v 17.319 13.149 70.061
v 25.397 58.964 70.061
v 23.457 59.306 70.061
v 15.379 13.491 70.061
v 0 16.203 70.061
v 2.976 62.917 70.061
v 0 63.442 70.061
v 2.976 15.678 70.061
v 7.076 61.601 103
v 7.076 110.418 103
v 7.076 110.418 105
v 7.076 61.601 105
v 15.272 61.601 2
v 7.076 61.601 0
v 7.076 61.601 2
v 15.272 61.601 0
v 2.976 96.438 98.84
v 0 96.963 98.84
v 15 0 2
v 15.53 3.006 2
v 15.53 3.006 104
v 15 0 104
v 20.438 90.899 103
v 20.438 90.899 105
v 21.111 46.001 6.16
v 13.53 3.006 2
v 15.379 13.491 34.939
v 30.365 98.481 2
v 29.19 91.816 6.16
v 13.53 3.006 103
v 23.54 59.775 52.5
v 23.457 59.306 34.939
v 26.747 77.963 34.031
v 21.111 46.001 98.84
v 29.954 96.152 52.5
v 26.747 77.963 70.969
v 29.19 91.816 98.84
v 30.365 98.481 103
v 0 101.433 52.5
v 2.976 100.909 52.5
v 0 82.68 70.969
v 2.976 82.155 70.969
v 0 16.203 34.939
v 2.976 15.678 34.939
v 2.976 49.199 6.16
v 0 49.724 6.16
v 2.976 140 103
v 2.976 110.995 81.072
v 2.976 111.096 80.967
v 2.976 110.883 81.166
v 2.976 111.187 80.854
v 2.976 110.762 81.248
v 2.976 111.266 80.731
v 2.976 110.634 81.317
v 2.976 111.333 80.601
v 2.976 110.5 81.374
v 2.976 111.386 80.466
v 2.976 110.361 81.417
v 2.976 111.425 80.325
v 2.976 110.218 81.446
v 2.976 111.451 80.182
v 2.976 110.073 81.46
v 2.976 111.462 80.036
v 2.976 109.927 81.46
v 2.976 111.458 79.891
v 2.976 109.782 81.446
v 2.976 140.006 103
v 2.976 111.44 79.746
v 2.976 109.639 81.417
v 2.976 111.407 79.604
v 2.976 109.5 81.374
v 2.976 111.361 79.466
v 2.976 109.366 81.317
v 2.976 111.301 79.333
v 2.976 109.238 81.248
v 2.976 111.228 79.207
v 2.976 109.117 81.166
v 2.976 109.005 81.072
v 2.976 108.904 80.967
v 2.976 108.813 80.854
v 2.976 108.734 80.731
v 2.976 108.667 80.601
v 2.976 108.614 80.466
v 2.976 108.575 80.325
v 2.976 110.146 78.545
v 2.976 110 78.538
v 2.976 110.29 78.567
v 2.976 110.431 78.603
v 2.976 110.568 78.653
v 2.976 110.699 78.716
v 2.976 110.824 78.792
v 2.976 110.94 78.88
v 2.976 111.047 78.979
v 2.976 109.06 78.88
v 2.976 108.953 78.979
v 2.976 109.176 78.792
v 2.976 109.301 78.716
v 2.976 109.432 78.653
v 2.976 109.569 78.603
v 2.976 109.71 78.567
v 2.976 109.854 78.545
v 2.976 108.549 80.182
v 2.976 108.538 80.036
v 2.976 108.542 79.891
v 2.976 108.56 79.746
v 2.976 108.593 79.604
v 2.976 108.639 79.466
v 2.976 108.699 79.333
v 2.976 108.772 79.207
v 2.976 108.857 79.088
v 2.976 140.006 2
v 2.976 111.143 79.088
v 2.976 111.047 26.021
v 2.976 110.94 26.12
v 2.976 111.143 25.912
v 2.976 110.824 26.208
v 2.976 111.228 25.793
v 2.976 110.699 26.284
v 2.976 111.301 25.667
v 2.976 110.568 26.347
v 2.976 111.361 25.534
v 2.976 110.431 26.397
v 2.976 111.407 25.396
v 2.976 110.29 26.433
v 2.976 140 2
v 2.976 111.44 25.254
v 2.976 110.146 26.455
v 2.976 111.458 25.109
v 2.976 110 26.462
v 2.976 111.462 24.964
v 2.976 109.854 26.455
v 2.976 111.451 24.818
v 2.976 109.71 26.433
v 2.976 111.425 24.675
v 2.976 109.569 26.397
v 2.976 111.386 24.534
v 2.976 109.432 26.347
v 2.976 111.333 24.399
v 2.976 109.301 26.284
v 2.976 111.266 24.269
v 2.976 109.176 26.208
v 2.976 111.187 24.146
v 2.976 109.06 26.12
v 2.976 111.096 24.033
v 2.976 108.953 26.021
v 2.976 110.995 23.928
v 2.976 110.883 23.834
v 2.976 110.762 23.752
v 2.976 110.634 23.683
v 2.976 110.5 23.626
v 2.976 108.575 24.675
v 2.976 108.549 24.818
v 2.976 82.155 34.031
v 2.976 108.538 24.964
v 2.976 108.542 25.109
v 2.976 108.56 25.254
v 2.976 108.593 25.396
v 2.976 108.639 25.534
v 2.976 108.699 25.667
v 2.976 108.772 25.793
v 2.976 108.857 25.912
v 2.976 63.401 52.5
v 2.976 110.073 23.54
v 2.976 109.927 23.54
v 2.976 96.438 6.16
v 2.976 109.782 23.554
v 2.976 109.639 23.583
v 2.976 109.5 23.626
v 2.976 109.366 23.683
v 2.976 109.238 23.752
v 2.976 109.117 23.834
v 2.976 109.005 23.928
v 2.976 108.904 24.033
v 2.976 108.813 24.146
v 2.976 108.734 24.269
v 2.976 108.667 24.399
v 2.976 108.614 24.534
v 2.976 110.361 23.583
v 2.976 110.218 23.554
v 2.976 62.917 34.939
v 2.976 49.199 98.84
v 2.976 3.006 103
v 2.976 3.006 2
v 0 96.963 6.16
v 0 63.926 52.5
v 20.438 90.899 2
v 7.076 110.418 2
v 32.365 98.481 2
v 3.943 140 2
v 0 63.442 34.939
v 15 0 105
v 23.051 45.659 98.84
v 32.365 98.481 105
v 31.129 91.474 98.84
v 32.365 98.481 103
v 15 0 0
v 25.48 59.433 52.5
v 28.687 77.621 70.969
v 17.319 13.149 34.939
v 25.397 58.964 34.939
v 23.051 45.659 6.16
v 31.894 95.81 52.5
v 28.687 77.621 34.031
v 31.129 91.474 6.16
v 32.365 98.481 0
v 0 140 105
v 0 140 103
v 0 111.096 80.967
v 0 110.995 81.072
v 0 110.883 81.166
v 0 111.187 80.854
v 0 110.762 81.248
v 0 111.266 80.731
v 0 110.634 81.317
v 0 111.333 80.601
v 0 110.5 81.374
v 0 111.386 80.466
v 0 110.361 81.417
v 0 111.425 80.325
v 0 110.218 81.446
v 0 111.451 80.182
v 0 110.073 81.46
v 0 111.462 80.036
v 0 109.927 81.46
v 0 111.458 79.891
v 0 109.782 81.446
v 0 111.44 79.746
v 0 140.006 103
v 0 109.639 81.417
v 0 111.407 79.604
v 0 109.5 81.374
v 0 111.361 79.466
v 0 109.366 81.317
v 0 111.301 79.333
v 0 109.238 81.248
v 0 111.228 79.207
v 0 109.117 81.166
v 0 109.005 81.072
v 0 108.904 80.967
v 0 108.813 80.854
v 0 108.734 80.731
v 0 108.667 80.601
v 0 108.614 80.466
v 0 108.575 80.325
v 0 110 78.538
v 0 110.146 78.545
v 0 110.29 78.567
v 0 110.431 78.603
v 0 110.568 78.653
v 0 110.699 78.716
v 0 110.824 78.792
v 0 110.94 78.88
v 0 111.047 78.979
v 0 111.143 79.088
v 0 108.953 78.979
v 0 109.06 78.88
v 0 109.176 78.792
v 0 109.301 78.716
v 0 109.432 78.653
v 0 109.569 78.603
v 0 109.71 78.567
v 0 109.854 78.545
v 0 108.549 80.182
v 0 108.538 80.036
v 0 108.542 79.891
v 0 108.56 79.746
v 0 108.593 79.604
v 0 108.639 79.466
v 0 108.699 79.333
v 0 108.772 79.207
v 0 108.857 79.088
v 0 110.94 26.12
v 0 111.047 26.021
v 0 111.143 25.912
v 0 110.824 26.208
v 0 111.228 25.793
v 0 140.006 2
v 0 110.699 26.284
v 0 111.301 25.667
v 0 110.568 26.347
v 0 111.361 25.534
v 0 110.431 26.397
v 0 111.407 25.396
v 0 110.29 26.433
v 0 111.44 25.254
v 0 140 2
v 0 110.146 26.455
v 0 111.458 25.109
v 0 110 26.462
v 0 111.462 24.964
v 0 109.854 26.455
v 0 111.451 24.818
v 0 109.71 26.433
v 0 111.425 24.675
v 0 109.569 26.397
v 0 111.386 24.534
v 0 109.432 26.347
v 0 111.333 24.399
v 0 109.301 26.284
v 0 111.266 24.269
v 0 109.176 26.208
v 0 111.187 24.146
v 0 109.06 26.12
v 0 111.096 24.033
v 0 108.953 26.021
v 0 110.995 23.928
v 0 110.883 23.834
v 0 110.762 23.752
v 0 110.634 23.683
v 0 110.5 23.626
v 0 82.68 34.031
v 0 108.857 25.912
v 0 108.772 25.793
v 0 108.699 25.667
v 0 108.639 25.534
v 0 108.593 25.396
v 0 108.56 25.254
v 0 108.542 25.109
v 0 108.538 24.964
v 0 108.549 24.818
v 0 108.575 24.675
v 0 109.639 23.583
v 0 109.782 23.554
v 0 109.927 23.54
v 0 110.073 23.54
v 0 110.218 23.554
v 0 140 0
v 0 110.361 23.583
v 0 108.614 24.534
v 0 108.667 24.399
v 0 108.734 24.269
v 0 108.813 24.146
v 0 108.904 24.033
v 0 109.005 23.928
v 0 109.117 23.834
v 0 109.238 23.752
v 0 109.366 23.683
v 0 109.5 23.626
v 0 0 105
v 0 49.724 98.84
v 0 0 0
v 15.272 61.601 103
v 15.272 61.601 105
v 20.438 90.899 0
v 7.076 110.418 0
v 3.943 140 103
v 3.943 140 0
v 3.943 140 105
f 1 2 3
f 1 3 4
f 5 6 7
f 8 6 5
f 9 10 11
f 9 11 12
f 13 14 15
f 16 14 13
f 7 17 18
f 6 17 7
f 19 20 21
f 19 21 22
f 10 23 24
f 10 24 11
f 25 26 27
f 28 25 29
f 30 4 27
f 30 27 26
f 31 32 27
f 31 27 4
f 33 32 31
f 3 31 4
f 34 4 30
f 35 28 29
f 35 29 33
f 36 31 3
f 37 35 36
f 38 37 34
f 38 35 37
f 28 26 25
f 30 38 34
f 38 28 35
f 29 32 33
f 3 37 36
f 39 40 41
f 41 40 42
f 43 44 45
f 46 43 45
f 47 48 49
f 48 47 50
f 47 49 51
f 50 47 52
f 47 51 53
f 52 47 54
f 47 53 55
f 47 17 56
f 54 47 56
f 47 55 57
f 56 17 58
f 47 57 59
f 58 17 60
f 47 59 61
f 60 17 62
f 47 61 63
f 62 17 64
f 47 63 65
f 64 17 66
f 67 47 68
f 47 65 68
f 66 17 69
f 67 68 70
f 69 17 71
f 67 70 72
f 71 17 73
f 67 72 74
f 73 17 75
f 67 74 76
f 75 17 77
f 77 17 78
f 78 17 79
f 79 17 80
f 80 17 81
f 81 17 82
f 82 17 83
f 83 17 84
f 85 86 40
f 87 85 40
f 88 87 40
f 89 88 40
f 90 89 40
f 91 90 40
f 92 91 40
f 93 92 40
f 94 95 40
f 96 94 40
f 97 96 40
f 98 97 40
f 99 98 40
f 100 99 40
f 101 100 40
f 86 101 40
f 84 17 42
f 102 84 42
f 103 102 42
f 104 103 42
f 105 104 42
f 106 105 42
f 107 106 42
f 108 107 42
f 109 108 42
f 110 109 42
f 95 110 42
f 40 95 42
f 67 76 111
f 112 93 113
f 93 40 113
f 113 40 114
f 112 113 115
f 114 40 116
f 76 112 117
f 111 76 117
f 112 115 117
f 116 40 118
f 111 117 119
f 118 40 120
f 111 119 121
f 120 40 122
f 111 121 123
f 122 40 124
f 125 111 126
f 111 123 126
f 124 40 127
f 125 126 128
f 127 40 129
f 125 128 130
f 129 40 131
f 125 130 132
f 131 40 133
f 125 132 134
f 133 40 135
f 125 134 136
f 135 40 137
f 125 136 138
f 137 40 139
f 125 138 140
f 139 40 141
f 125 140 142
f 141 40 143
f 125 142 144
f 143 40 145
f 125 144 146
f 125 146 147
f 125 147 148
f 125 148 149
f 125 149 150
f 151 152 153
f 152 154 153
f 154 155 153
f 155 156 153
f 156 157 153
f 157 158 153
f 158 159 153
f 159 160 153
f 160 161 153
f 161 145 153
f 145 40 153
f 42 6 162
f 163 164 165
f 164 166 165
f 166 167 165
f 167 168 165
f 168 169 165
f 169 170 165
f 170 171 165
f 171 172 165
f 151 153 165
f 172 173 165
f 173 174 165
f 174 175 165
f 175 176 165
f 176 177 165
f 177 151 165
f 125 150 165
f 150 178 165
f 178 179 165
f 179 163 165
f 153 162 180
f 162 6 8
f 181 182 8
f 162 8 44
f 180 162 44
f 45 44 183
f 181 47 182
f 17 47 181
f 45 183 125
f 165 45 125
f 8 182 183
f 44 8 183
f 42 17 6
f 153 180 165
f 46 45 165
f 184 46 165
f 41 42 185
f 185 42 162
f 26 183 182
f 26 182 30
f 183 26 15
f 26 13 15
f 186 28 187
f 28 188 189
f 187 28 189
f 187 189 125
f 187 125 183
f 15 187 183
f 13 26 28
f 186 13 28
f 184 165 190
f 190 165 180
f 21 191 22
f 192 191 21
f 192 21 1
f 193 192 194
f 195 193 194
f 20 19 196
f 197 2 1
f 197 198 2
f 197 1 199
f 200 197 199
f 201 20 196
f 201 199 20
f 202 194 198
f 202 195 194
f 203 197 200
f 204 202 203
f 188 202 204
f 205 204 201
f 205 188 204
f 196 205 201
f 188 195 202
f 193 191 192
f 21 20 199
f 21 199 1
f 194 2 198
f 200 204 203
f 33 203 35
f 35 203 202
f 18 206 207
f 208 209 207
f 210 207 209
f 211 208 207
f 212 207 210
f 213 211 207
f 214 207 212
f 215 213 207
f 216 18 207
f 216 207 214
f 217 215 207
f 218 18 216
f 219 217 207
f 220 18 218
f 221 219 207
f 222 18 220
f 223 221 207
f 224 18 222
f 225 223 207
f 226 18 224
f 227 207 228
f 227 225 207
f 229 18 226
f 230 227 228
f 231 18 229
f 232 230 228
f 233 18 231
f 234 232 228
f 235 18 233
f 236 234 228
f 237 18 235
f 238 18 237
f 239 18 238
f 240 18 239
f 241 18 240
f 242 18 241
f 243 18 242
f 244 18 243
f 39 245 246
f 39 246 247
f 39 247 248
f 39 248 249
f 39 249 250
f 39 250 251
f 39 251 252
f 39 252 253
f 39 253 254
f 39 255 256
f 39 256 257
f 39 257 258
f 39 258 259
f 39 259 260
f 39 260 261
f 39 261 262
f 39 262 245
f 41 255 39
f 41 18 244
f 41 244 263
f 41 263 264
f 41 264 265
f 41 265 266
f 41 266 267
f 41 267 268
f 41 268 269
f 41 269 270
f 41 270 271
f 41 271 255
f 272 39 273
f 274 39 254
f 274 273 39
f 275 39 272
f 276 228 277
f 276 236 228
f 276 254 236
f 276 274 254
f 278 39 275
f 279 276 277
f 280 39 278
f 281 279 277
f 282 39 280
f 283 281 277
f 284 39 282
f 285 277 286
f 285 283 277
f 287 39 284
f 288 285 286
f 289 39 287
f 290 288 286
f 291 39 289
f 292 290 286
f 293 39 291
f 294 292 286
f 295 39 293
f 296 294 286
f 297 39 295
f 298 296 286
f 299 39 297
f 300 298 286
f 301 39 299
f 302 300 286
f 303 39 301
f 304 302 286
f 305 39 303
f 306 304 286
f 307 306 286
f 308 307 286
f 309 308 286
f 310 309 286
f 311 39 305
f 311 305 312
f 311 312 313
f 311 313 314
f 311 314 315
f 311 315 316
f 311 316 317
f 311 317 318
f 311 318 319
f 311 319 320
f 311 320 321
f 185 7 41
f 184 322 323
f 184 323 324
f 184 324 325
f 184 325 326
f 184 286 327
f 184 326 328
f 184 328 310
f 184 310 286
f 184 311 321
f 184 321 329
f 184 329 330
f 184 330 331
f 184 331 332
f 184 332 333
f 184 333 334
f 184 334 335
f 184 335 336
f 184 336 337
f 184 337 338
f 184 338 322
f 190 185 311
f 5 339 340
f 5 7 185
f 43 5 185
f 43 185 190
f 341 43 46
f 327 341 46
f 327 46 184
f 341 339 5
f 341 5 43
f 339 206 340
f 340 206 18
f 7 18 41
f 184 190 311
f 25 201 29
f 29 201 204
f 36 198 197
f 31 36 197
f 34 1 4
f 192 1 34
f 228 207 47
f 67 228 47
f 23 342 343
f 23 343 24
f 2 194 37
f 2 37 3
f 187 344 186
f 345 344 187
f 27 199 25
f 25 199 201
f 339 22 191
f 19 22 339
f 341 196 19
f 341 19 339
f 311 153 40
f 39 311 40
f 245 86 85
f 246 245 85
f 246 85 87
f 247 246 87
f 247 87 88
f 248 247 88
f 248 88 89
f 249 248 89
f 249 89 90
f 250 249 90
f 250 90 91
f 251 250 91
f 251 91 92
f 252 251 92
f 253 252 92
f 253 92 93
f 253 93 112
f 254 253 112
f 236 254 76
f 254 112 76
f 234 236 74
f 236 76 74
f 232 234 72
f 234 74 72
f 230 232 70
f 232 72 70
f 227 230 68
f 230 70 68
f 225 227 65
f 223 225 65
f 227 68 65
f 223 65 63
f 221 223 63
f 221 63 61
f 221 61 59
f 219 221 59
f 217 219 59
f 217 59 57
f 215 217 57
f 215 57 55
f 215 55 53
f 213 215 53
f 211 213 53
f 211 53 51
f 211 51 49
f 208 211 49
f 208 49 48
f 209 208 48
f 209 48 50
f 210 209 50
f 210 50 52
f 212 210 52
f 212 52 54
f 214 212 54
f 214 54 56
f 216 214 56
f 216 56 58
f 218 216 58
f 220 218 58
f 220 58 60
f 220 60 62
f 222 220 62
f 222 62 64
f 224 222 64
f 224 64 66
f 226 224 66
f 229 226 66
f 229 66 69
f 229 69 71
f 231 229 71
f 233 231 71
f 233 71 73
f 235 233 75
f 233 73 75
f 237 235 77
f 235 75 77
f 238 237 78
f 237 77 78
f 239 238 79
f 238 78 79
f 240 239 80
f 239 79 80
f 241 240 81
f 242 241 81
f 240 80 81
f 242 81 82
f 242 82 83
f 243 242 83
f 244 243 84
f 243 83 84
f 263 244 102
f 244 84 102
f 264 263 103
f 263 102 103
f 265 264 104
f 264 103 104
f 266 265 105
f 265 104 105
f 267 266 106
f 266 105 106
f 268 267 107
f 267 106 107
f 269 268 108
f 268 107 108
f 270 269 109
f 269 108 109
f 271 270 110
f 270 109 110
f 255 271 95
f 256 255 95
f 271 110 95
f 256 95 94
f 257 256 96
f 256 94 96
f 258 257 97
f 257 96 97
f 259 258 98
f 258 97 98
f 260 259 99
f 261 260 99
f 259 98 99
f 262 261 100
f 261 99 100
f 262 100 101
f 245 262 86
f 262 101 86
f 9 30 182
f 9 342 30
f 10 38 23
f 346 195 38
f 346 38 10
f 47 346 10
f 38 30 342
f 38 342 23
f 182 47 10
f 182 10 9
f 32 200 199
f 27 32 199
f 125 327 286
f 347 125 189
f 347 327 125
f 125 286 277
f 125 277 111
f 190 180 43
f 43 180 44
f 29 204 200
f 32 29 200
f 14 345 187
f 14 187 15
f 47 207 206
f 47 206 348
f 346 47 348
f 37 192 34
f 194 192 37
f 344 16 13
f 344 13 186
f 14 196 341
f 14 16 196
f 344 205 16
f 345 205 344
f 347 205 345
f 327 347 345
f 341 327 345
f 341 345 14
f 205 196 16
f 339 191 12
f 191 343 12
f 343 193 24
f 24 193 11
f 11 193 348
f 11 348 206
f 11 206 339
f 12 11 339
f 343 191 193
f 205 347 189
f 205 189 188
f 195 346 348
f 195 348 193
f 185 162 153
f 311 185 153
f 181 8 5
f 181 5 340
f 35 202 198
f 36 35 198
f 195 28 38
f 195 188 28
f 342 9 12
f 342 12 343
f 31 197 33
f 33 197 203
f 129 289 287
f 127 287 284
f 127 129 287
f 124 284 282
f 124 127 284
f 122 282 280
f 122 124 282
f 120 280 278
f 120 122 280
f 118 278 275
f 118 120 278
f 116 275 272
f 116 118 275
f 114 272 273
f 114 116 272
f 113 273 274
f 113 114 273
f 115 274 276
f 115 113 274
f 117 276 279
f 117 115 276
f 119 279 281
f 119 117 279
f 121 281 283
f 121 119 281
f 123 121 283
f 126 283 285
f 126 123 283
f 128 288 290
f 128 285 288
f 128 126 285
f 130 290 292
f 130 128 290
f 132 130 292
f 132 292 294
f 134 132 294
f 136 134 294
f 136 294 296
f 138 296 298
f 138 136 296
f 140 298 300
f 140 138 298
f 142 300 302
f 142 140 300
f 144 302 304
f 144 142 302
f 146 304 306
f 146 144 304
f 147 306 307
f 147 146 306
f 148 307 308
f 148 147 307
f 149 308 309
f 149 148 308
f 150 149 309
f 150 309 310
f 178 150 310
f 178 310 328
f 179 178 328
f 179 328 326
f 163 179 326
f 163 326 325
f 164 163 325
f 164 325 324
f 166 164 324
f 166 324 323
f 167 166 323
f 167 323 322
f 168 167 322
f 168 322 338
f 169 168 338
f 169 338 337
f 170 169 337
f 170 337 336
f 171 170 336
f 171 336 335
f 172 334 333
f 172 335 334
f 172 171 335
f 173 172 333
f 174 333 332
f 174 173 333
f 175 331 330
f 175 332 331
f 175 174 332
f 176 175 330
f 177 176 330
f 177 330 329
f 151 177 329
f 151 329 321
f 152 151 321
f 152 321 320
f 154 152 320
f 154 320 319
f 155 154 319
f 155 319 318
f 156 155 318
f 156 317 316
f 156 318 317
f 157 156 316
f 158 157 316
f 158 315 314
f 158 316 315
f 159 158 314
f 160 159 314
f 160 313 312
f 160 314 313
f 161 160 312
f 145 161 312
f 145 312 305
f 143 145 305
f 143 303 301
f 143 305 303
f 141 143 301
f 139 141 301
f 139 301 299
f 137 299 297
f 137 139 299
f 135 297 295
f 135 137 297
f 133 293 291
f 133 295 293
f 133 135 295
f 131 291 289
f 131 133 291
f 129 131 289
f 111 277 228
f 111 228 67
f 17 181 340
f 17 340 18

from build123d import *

# Parameters (mm, degrees)
BOSS_EXTRU_1_DEPTH         = 2
BOSS_EXTRU_2_DEPTH         = 102
R_P_TITION_LIN_AIRE1_COUNT = 2
R_P_TITION_LIN_AIRE1_PITCH = 103
ESQUISSE5_W                = 2.97567345
ESQUISSE5_H                = 101
BOSS_EXTRU_3_DEPTH         = 137
ESQUISSE6_W                = 2
ESQUISSE6_H                = 101
ESQUISSE9_R                = 1.462141601
ENL_V_MAT_EXTRU_8_DEPTH    = 10
ENL_V_MAT_EXTRU_10_DEPTH   = 178.957906594
ENL_V_MAT_EXTRU_11_DEPTH   = 178.957906594
ENL_V_MAT_EXTRU_12_DEPTH   = 178.97245401


with BuildPart() as part:
    # Esquisse2 → Boss.-Extru.1 (new body)
    with BuildSketch(Plane.XY):
        Polygon((0, 0), (0, 140), (3.942801894, 140), (32.364817767, 98.480775301), (15, 0), align=None)
    boss_extru_1 = extrude(amount=BOSS_EXTRU_1_DEPTH)

    # Esquisse4 → Boss.-Extru.2 (add)
    with BuildSketch(Plane.XY.offset(2)):
        Polygon((0, 0), (0, 3.006117571), (15.530059635, 3.006117571), (15, 0), align=None)
    extrude(amount=BOSS_EXTRU_2_DEPTH)

    # Répétition linéaire1: Boss.-Extru.1 ×2
    with Locations(*[(0, 0, i * R_P_TITION_LIN_AIRE1_PITCH) for i in range(1, R_P_TITION_LIN_AIRE1_COUNT)]):
        add(boss_extru_1)

    # Esquisse5 → Boss.-Extru.3 (add)
    with BuildSketch(Plane(origin=(0, 3.006117571, 0), x_dir=(1, 0, 0), z_dir=(0, 1, 0))):
        with Locations((1.487836725, -52.5)):
            Rectangle(ESQUISSE5_W, ESQUISSE5_H)
    extrude(amount=BOSS_EXTRU_3_DEPTH)

    # Balayage1: sweep along a curve in space
    with BuildLine() as balayage1_path:
        Line((15.530059635, 3.006117571, 103), (32.364817767, 98.480775301, 103))
    # Esquisse6 → Balayage1 (sweep)
    with BuildSketch(Plane(origin=(0, 3.006117571, 0), x_dir=(1, 0, 0), z_dir=(0, 1, 0))):
        with Locations((14.530059635, -52.5)):
            Rectangle(ESQUISSE6_W, ESQUISSE6_H)
    sweep(path=balayage1_path.line)

    # Esquisse9 → Enlèv. mat.-Extru.8 (cut)
    with BuildSketch(Plane(origin=(2.97567345, 0, 0), x_dir=(0, 0, -1), z_dir=(1, 0, 0))):
        with Locations((-80, 110)):
            Circle(ESQUISSE9_R)
    enl_v_mat_extru_8 = extrude(amount=-ENL_V_MAT_EXTRU_8_DEPTH, mode=Mode.SUBTRACT)

    # Symétrie3: Enlèv. mat.-Extru.8 across plane
    add(enl_v_mat_extru_8.mirror(Plane.XY.offset(52.5)), mode=Mode.SUBTRACT)

    # Esquisse11 → Enlèv. mat.-Extru.10 (cut, through all)
    with BuildSketch(Plane(origin=(14.547694656, -2.565151075, 0), x_dir=(0, 0, -1), z_dir=(0.9848077530122089, -0.17364817766692642, 0))):
        Polygon((-6.160430803, 48.968309083), (-6.160430803, 95.489627834), (-34.939480046, 62.478304571), (-34.939480046, 15.95698582), align=None)
    enl_v_mat_extru_10 = extrude(amount=-ENL_V_MAT_EXTRU_10_DEPTH, mode=Mode.SUBTRACT)

    # Symétrie4: Enlèv. mat.-Extru.10 across plane
    add(enl_v_mat_extru_10.mirror(Plane.XY.offset(52.5)), mode=Mode.SUBTRACT)

    # Esquisse13 → Enlèv. mat.-Extru.11 (cut, through all)
    with BuildSketch(Plane(origin=(14.547694656, -2.565151075, 0), x_dir=(0, 0, -1), z_dir=(0.9848077530122089, -0.17364817766692642, 0))):
        Polygon((-70.968675793, 81.423632051), (-52.5, 62.954956258), (-34.031324207, 81.423632051), (-52.5, 99.892307844), align=None)
    extrude(amount=-ENL_V_MAT_EXTRU_11_DEPTH, mode=Mode.SUBTRACT)

    # Esquisse14 → Enlèv. mat.-Extru.12 (cut, through all)
    with BuildSketch(Plane(origin=(0, 0, 0), x_dir=(-1, 0, 0), z_dir=(0, 0, -1))):
        Polygon((-7.076060975, 110.418465172), (-7.076060975, 61.600550279), (-15.271885521, 61.600550279), (-20.438019848, 90.899153967), align=None)
    extrude(amount=-ENL_V_MAT_EXTRU_12_DEPTH, mode=Mode.SUBTRACT)


solid = part.part
